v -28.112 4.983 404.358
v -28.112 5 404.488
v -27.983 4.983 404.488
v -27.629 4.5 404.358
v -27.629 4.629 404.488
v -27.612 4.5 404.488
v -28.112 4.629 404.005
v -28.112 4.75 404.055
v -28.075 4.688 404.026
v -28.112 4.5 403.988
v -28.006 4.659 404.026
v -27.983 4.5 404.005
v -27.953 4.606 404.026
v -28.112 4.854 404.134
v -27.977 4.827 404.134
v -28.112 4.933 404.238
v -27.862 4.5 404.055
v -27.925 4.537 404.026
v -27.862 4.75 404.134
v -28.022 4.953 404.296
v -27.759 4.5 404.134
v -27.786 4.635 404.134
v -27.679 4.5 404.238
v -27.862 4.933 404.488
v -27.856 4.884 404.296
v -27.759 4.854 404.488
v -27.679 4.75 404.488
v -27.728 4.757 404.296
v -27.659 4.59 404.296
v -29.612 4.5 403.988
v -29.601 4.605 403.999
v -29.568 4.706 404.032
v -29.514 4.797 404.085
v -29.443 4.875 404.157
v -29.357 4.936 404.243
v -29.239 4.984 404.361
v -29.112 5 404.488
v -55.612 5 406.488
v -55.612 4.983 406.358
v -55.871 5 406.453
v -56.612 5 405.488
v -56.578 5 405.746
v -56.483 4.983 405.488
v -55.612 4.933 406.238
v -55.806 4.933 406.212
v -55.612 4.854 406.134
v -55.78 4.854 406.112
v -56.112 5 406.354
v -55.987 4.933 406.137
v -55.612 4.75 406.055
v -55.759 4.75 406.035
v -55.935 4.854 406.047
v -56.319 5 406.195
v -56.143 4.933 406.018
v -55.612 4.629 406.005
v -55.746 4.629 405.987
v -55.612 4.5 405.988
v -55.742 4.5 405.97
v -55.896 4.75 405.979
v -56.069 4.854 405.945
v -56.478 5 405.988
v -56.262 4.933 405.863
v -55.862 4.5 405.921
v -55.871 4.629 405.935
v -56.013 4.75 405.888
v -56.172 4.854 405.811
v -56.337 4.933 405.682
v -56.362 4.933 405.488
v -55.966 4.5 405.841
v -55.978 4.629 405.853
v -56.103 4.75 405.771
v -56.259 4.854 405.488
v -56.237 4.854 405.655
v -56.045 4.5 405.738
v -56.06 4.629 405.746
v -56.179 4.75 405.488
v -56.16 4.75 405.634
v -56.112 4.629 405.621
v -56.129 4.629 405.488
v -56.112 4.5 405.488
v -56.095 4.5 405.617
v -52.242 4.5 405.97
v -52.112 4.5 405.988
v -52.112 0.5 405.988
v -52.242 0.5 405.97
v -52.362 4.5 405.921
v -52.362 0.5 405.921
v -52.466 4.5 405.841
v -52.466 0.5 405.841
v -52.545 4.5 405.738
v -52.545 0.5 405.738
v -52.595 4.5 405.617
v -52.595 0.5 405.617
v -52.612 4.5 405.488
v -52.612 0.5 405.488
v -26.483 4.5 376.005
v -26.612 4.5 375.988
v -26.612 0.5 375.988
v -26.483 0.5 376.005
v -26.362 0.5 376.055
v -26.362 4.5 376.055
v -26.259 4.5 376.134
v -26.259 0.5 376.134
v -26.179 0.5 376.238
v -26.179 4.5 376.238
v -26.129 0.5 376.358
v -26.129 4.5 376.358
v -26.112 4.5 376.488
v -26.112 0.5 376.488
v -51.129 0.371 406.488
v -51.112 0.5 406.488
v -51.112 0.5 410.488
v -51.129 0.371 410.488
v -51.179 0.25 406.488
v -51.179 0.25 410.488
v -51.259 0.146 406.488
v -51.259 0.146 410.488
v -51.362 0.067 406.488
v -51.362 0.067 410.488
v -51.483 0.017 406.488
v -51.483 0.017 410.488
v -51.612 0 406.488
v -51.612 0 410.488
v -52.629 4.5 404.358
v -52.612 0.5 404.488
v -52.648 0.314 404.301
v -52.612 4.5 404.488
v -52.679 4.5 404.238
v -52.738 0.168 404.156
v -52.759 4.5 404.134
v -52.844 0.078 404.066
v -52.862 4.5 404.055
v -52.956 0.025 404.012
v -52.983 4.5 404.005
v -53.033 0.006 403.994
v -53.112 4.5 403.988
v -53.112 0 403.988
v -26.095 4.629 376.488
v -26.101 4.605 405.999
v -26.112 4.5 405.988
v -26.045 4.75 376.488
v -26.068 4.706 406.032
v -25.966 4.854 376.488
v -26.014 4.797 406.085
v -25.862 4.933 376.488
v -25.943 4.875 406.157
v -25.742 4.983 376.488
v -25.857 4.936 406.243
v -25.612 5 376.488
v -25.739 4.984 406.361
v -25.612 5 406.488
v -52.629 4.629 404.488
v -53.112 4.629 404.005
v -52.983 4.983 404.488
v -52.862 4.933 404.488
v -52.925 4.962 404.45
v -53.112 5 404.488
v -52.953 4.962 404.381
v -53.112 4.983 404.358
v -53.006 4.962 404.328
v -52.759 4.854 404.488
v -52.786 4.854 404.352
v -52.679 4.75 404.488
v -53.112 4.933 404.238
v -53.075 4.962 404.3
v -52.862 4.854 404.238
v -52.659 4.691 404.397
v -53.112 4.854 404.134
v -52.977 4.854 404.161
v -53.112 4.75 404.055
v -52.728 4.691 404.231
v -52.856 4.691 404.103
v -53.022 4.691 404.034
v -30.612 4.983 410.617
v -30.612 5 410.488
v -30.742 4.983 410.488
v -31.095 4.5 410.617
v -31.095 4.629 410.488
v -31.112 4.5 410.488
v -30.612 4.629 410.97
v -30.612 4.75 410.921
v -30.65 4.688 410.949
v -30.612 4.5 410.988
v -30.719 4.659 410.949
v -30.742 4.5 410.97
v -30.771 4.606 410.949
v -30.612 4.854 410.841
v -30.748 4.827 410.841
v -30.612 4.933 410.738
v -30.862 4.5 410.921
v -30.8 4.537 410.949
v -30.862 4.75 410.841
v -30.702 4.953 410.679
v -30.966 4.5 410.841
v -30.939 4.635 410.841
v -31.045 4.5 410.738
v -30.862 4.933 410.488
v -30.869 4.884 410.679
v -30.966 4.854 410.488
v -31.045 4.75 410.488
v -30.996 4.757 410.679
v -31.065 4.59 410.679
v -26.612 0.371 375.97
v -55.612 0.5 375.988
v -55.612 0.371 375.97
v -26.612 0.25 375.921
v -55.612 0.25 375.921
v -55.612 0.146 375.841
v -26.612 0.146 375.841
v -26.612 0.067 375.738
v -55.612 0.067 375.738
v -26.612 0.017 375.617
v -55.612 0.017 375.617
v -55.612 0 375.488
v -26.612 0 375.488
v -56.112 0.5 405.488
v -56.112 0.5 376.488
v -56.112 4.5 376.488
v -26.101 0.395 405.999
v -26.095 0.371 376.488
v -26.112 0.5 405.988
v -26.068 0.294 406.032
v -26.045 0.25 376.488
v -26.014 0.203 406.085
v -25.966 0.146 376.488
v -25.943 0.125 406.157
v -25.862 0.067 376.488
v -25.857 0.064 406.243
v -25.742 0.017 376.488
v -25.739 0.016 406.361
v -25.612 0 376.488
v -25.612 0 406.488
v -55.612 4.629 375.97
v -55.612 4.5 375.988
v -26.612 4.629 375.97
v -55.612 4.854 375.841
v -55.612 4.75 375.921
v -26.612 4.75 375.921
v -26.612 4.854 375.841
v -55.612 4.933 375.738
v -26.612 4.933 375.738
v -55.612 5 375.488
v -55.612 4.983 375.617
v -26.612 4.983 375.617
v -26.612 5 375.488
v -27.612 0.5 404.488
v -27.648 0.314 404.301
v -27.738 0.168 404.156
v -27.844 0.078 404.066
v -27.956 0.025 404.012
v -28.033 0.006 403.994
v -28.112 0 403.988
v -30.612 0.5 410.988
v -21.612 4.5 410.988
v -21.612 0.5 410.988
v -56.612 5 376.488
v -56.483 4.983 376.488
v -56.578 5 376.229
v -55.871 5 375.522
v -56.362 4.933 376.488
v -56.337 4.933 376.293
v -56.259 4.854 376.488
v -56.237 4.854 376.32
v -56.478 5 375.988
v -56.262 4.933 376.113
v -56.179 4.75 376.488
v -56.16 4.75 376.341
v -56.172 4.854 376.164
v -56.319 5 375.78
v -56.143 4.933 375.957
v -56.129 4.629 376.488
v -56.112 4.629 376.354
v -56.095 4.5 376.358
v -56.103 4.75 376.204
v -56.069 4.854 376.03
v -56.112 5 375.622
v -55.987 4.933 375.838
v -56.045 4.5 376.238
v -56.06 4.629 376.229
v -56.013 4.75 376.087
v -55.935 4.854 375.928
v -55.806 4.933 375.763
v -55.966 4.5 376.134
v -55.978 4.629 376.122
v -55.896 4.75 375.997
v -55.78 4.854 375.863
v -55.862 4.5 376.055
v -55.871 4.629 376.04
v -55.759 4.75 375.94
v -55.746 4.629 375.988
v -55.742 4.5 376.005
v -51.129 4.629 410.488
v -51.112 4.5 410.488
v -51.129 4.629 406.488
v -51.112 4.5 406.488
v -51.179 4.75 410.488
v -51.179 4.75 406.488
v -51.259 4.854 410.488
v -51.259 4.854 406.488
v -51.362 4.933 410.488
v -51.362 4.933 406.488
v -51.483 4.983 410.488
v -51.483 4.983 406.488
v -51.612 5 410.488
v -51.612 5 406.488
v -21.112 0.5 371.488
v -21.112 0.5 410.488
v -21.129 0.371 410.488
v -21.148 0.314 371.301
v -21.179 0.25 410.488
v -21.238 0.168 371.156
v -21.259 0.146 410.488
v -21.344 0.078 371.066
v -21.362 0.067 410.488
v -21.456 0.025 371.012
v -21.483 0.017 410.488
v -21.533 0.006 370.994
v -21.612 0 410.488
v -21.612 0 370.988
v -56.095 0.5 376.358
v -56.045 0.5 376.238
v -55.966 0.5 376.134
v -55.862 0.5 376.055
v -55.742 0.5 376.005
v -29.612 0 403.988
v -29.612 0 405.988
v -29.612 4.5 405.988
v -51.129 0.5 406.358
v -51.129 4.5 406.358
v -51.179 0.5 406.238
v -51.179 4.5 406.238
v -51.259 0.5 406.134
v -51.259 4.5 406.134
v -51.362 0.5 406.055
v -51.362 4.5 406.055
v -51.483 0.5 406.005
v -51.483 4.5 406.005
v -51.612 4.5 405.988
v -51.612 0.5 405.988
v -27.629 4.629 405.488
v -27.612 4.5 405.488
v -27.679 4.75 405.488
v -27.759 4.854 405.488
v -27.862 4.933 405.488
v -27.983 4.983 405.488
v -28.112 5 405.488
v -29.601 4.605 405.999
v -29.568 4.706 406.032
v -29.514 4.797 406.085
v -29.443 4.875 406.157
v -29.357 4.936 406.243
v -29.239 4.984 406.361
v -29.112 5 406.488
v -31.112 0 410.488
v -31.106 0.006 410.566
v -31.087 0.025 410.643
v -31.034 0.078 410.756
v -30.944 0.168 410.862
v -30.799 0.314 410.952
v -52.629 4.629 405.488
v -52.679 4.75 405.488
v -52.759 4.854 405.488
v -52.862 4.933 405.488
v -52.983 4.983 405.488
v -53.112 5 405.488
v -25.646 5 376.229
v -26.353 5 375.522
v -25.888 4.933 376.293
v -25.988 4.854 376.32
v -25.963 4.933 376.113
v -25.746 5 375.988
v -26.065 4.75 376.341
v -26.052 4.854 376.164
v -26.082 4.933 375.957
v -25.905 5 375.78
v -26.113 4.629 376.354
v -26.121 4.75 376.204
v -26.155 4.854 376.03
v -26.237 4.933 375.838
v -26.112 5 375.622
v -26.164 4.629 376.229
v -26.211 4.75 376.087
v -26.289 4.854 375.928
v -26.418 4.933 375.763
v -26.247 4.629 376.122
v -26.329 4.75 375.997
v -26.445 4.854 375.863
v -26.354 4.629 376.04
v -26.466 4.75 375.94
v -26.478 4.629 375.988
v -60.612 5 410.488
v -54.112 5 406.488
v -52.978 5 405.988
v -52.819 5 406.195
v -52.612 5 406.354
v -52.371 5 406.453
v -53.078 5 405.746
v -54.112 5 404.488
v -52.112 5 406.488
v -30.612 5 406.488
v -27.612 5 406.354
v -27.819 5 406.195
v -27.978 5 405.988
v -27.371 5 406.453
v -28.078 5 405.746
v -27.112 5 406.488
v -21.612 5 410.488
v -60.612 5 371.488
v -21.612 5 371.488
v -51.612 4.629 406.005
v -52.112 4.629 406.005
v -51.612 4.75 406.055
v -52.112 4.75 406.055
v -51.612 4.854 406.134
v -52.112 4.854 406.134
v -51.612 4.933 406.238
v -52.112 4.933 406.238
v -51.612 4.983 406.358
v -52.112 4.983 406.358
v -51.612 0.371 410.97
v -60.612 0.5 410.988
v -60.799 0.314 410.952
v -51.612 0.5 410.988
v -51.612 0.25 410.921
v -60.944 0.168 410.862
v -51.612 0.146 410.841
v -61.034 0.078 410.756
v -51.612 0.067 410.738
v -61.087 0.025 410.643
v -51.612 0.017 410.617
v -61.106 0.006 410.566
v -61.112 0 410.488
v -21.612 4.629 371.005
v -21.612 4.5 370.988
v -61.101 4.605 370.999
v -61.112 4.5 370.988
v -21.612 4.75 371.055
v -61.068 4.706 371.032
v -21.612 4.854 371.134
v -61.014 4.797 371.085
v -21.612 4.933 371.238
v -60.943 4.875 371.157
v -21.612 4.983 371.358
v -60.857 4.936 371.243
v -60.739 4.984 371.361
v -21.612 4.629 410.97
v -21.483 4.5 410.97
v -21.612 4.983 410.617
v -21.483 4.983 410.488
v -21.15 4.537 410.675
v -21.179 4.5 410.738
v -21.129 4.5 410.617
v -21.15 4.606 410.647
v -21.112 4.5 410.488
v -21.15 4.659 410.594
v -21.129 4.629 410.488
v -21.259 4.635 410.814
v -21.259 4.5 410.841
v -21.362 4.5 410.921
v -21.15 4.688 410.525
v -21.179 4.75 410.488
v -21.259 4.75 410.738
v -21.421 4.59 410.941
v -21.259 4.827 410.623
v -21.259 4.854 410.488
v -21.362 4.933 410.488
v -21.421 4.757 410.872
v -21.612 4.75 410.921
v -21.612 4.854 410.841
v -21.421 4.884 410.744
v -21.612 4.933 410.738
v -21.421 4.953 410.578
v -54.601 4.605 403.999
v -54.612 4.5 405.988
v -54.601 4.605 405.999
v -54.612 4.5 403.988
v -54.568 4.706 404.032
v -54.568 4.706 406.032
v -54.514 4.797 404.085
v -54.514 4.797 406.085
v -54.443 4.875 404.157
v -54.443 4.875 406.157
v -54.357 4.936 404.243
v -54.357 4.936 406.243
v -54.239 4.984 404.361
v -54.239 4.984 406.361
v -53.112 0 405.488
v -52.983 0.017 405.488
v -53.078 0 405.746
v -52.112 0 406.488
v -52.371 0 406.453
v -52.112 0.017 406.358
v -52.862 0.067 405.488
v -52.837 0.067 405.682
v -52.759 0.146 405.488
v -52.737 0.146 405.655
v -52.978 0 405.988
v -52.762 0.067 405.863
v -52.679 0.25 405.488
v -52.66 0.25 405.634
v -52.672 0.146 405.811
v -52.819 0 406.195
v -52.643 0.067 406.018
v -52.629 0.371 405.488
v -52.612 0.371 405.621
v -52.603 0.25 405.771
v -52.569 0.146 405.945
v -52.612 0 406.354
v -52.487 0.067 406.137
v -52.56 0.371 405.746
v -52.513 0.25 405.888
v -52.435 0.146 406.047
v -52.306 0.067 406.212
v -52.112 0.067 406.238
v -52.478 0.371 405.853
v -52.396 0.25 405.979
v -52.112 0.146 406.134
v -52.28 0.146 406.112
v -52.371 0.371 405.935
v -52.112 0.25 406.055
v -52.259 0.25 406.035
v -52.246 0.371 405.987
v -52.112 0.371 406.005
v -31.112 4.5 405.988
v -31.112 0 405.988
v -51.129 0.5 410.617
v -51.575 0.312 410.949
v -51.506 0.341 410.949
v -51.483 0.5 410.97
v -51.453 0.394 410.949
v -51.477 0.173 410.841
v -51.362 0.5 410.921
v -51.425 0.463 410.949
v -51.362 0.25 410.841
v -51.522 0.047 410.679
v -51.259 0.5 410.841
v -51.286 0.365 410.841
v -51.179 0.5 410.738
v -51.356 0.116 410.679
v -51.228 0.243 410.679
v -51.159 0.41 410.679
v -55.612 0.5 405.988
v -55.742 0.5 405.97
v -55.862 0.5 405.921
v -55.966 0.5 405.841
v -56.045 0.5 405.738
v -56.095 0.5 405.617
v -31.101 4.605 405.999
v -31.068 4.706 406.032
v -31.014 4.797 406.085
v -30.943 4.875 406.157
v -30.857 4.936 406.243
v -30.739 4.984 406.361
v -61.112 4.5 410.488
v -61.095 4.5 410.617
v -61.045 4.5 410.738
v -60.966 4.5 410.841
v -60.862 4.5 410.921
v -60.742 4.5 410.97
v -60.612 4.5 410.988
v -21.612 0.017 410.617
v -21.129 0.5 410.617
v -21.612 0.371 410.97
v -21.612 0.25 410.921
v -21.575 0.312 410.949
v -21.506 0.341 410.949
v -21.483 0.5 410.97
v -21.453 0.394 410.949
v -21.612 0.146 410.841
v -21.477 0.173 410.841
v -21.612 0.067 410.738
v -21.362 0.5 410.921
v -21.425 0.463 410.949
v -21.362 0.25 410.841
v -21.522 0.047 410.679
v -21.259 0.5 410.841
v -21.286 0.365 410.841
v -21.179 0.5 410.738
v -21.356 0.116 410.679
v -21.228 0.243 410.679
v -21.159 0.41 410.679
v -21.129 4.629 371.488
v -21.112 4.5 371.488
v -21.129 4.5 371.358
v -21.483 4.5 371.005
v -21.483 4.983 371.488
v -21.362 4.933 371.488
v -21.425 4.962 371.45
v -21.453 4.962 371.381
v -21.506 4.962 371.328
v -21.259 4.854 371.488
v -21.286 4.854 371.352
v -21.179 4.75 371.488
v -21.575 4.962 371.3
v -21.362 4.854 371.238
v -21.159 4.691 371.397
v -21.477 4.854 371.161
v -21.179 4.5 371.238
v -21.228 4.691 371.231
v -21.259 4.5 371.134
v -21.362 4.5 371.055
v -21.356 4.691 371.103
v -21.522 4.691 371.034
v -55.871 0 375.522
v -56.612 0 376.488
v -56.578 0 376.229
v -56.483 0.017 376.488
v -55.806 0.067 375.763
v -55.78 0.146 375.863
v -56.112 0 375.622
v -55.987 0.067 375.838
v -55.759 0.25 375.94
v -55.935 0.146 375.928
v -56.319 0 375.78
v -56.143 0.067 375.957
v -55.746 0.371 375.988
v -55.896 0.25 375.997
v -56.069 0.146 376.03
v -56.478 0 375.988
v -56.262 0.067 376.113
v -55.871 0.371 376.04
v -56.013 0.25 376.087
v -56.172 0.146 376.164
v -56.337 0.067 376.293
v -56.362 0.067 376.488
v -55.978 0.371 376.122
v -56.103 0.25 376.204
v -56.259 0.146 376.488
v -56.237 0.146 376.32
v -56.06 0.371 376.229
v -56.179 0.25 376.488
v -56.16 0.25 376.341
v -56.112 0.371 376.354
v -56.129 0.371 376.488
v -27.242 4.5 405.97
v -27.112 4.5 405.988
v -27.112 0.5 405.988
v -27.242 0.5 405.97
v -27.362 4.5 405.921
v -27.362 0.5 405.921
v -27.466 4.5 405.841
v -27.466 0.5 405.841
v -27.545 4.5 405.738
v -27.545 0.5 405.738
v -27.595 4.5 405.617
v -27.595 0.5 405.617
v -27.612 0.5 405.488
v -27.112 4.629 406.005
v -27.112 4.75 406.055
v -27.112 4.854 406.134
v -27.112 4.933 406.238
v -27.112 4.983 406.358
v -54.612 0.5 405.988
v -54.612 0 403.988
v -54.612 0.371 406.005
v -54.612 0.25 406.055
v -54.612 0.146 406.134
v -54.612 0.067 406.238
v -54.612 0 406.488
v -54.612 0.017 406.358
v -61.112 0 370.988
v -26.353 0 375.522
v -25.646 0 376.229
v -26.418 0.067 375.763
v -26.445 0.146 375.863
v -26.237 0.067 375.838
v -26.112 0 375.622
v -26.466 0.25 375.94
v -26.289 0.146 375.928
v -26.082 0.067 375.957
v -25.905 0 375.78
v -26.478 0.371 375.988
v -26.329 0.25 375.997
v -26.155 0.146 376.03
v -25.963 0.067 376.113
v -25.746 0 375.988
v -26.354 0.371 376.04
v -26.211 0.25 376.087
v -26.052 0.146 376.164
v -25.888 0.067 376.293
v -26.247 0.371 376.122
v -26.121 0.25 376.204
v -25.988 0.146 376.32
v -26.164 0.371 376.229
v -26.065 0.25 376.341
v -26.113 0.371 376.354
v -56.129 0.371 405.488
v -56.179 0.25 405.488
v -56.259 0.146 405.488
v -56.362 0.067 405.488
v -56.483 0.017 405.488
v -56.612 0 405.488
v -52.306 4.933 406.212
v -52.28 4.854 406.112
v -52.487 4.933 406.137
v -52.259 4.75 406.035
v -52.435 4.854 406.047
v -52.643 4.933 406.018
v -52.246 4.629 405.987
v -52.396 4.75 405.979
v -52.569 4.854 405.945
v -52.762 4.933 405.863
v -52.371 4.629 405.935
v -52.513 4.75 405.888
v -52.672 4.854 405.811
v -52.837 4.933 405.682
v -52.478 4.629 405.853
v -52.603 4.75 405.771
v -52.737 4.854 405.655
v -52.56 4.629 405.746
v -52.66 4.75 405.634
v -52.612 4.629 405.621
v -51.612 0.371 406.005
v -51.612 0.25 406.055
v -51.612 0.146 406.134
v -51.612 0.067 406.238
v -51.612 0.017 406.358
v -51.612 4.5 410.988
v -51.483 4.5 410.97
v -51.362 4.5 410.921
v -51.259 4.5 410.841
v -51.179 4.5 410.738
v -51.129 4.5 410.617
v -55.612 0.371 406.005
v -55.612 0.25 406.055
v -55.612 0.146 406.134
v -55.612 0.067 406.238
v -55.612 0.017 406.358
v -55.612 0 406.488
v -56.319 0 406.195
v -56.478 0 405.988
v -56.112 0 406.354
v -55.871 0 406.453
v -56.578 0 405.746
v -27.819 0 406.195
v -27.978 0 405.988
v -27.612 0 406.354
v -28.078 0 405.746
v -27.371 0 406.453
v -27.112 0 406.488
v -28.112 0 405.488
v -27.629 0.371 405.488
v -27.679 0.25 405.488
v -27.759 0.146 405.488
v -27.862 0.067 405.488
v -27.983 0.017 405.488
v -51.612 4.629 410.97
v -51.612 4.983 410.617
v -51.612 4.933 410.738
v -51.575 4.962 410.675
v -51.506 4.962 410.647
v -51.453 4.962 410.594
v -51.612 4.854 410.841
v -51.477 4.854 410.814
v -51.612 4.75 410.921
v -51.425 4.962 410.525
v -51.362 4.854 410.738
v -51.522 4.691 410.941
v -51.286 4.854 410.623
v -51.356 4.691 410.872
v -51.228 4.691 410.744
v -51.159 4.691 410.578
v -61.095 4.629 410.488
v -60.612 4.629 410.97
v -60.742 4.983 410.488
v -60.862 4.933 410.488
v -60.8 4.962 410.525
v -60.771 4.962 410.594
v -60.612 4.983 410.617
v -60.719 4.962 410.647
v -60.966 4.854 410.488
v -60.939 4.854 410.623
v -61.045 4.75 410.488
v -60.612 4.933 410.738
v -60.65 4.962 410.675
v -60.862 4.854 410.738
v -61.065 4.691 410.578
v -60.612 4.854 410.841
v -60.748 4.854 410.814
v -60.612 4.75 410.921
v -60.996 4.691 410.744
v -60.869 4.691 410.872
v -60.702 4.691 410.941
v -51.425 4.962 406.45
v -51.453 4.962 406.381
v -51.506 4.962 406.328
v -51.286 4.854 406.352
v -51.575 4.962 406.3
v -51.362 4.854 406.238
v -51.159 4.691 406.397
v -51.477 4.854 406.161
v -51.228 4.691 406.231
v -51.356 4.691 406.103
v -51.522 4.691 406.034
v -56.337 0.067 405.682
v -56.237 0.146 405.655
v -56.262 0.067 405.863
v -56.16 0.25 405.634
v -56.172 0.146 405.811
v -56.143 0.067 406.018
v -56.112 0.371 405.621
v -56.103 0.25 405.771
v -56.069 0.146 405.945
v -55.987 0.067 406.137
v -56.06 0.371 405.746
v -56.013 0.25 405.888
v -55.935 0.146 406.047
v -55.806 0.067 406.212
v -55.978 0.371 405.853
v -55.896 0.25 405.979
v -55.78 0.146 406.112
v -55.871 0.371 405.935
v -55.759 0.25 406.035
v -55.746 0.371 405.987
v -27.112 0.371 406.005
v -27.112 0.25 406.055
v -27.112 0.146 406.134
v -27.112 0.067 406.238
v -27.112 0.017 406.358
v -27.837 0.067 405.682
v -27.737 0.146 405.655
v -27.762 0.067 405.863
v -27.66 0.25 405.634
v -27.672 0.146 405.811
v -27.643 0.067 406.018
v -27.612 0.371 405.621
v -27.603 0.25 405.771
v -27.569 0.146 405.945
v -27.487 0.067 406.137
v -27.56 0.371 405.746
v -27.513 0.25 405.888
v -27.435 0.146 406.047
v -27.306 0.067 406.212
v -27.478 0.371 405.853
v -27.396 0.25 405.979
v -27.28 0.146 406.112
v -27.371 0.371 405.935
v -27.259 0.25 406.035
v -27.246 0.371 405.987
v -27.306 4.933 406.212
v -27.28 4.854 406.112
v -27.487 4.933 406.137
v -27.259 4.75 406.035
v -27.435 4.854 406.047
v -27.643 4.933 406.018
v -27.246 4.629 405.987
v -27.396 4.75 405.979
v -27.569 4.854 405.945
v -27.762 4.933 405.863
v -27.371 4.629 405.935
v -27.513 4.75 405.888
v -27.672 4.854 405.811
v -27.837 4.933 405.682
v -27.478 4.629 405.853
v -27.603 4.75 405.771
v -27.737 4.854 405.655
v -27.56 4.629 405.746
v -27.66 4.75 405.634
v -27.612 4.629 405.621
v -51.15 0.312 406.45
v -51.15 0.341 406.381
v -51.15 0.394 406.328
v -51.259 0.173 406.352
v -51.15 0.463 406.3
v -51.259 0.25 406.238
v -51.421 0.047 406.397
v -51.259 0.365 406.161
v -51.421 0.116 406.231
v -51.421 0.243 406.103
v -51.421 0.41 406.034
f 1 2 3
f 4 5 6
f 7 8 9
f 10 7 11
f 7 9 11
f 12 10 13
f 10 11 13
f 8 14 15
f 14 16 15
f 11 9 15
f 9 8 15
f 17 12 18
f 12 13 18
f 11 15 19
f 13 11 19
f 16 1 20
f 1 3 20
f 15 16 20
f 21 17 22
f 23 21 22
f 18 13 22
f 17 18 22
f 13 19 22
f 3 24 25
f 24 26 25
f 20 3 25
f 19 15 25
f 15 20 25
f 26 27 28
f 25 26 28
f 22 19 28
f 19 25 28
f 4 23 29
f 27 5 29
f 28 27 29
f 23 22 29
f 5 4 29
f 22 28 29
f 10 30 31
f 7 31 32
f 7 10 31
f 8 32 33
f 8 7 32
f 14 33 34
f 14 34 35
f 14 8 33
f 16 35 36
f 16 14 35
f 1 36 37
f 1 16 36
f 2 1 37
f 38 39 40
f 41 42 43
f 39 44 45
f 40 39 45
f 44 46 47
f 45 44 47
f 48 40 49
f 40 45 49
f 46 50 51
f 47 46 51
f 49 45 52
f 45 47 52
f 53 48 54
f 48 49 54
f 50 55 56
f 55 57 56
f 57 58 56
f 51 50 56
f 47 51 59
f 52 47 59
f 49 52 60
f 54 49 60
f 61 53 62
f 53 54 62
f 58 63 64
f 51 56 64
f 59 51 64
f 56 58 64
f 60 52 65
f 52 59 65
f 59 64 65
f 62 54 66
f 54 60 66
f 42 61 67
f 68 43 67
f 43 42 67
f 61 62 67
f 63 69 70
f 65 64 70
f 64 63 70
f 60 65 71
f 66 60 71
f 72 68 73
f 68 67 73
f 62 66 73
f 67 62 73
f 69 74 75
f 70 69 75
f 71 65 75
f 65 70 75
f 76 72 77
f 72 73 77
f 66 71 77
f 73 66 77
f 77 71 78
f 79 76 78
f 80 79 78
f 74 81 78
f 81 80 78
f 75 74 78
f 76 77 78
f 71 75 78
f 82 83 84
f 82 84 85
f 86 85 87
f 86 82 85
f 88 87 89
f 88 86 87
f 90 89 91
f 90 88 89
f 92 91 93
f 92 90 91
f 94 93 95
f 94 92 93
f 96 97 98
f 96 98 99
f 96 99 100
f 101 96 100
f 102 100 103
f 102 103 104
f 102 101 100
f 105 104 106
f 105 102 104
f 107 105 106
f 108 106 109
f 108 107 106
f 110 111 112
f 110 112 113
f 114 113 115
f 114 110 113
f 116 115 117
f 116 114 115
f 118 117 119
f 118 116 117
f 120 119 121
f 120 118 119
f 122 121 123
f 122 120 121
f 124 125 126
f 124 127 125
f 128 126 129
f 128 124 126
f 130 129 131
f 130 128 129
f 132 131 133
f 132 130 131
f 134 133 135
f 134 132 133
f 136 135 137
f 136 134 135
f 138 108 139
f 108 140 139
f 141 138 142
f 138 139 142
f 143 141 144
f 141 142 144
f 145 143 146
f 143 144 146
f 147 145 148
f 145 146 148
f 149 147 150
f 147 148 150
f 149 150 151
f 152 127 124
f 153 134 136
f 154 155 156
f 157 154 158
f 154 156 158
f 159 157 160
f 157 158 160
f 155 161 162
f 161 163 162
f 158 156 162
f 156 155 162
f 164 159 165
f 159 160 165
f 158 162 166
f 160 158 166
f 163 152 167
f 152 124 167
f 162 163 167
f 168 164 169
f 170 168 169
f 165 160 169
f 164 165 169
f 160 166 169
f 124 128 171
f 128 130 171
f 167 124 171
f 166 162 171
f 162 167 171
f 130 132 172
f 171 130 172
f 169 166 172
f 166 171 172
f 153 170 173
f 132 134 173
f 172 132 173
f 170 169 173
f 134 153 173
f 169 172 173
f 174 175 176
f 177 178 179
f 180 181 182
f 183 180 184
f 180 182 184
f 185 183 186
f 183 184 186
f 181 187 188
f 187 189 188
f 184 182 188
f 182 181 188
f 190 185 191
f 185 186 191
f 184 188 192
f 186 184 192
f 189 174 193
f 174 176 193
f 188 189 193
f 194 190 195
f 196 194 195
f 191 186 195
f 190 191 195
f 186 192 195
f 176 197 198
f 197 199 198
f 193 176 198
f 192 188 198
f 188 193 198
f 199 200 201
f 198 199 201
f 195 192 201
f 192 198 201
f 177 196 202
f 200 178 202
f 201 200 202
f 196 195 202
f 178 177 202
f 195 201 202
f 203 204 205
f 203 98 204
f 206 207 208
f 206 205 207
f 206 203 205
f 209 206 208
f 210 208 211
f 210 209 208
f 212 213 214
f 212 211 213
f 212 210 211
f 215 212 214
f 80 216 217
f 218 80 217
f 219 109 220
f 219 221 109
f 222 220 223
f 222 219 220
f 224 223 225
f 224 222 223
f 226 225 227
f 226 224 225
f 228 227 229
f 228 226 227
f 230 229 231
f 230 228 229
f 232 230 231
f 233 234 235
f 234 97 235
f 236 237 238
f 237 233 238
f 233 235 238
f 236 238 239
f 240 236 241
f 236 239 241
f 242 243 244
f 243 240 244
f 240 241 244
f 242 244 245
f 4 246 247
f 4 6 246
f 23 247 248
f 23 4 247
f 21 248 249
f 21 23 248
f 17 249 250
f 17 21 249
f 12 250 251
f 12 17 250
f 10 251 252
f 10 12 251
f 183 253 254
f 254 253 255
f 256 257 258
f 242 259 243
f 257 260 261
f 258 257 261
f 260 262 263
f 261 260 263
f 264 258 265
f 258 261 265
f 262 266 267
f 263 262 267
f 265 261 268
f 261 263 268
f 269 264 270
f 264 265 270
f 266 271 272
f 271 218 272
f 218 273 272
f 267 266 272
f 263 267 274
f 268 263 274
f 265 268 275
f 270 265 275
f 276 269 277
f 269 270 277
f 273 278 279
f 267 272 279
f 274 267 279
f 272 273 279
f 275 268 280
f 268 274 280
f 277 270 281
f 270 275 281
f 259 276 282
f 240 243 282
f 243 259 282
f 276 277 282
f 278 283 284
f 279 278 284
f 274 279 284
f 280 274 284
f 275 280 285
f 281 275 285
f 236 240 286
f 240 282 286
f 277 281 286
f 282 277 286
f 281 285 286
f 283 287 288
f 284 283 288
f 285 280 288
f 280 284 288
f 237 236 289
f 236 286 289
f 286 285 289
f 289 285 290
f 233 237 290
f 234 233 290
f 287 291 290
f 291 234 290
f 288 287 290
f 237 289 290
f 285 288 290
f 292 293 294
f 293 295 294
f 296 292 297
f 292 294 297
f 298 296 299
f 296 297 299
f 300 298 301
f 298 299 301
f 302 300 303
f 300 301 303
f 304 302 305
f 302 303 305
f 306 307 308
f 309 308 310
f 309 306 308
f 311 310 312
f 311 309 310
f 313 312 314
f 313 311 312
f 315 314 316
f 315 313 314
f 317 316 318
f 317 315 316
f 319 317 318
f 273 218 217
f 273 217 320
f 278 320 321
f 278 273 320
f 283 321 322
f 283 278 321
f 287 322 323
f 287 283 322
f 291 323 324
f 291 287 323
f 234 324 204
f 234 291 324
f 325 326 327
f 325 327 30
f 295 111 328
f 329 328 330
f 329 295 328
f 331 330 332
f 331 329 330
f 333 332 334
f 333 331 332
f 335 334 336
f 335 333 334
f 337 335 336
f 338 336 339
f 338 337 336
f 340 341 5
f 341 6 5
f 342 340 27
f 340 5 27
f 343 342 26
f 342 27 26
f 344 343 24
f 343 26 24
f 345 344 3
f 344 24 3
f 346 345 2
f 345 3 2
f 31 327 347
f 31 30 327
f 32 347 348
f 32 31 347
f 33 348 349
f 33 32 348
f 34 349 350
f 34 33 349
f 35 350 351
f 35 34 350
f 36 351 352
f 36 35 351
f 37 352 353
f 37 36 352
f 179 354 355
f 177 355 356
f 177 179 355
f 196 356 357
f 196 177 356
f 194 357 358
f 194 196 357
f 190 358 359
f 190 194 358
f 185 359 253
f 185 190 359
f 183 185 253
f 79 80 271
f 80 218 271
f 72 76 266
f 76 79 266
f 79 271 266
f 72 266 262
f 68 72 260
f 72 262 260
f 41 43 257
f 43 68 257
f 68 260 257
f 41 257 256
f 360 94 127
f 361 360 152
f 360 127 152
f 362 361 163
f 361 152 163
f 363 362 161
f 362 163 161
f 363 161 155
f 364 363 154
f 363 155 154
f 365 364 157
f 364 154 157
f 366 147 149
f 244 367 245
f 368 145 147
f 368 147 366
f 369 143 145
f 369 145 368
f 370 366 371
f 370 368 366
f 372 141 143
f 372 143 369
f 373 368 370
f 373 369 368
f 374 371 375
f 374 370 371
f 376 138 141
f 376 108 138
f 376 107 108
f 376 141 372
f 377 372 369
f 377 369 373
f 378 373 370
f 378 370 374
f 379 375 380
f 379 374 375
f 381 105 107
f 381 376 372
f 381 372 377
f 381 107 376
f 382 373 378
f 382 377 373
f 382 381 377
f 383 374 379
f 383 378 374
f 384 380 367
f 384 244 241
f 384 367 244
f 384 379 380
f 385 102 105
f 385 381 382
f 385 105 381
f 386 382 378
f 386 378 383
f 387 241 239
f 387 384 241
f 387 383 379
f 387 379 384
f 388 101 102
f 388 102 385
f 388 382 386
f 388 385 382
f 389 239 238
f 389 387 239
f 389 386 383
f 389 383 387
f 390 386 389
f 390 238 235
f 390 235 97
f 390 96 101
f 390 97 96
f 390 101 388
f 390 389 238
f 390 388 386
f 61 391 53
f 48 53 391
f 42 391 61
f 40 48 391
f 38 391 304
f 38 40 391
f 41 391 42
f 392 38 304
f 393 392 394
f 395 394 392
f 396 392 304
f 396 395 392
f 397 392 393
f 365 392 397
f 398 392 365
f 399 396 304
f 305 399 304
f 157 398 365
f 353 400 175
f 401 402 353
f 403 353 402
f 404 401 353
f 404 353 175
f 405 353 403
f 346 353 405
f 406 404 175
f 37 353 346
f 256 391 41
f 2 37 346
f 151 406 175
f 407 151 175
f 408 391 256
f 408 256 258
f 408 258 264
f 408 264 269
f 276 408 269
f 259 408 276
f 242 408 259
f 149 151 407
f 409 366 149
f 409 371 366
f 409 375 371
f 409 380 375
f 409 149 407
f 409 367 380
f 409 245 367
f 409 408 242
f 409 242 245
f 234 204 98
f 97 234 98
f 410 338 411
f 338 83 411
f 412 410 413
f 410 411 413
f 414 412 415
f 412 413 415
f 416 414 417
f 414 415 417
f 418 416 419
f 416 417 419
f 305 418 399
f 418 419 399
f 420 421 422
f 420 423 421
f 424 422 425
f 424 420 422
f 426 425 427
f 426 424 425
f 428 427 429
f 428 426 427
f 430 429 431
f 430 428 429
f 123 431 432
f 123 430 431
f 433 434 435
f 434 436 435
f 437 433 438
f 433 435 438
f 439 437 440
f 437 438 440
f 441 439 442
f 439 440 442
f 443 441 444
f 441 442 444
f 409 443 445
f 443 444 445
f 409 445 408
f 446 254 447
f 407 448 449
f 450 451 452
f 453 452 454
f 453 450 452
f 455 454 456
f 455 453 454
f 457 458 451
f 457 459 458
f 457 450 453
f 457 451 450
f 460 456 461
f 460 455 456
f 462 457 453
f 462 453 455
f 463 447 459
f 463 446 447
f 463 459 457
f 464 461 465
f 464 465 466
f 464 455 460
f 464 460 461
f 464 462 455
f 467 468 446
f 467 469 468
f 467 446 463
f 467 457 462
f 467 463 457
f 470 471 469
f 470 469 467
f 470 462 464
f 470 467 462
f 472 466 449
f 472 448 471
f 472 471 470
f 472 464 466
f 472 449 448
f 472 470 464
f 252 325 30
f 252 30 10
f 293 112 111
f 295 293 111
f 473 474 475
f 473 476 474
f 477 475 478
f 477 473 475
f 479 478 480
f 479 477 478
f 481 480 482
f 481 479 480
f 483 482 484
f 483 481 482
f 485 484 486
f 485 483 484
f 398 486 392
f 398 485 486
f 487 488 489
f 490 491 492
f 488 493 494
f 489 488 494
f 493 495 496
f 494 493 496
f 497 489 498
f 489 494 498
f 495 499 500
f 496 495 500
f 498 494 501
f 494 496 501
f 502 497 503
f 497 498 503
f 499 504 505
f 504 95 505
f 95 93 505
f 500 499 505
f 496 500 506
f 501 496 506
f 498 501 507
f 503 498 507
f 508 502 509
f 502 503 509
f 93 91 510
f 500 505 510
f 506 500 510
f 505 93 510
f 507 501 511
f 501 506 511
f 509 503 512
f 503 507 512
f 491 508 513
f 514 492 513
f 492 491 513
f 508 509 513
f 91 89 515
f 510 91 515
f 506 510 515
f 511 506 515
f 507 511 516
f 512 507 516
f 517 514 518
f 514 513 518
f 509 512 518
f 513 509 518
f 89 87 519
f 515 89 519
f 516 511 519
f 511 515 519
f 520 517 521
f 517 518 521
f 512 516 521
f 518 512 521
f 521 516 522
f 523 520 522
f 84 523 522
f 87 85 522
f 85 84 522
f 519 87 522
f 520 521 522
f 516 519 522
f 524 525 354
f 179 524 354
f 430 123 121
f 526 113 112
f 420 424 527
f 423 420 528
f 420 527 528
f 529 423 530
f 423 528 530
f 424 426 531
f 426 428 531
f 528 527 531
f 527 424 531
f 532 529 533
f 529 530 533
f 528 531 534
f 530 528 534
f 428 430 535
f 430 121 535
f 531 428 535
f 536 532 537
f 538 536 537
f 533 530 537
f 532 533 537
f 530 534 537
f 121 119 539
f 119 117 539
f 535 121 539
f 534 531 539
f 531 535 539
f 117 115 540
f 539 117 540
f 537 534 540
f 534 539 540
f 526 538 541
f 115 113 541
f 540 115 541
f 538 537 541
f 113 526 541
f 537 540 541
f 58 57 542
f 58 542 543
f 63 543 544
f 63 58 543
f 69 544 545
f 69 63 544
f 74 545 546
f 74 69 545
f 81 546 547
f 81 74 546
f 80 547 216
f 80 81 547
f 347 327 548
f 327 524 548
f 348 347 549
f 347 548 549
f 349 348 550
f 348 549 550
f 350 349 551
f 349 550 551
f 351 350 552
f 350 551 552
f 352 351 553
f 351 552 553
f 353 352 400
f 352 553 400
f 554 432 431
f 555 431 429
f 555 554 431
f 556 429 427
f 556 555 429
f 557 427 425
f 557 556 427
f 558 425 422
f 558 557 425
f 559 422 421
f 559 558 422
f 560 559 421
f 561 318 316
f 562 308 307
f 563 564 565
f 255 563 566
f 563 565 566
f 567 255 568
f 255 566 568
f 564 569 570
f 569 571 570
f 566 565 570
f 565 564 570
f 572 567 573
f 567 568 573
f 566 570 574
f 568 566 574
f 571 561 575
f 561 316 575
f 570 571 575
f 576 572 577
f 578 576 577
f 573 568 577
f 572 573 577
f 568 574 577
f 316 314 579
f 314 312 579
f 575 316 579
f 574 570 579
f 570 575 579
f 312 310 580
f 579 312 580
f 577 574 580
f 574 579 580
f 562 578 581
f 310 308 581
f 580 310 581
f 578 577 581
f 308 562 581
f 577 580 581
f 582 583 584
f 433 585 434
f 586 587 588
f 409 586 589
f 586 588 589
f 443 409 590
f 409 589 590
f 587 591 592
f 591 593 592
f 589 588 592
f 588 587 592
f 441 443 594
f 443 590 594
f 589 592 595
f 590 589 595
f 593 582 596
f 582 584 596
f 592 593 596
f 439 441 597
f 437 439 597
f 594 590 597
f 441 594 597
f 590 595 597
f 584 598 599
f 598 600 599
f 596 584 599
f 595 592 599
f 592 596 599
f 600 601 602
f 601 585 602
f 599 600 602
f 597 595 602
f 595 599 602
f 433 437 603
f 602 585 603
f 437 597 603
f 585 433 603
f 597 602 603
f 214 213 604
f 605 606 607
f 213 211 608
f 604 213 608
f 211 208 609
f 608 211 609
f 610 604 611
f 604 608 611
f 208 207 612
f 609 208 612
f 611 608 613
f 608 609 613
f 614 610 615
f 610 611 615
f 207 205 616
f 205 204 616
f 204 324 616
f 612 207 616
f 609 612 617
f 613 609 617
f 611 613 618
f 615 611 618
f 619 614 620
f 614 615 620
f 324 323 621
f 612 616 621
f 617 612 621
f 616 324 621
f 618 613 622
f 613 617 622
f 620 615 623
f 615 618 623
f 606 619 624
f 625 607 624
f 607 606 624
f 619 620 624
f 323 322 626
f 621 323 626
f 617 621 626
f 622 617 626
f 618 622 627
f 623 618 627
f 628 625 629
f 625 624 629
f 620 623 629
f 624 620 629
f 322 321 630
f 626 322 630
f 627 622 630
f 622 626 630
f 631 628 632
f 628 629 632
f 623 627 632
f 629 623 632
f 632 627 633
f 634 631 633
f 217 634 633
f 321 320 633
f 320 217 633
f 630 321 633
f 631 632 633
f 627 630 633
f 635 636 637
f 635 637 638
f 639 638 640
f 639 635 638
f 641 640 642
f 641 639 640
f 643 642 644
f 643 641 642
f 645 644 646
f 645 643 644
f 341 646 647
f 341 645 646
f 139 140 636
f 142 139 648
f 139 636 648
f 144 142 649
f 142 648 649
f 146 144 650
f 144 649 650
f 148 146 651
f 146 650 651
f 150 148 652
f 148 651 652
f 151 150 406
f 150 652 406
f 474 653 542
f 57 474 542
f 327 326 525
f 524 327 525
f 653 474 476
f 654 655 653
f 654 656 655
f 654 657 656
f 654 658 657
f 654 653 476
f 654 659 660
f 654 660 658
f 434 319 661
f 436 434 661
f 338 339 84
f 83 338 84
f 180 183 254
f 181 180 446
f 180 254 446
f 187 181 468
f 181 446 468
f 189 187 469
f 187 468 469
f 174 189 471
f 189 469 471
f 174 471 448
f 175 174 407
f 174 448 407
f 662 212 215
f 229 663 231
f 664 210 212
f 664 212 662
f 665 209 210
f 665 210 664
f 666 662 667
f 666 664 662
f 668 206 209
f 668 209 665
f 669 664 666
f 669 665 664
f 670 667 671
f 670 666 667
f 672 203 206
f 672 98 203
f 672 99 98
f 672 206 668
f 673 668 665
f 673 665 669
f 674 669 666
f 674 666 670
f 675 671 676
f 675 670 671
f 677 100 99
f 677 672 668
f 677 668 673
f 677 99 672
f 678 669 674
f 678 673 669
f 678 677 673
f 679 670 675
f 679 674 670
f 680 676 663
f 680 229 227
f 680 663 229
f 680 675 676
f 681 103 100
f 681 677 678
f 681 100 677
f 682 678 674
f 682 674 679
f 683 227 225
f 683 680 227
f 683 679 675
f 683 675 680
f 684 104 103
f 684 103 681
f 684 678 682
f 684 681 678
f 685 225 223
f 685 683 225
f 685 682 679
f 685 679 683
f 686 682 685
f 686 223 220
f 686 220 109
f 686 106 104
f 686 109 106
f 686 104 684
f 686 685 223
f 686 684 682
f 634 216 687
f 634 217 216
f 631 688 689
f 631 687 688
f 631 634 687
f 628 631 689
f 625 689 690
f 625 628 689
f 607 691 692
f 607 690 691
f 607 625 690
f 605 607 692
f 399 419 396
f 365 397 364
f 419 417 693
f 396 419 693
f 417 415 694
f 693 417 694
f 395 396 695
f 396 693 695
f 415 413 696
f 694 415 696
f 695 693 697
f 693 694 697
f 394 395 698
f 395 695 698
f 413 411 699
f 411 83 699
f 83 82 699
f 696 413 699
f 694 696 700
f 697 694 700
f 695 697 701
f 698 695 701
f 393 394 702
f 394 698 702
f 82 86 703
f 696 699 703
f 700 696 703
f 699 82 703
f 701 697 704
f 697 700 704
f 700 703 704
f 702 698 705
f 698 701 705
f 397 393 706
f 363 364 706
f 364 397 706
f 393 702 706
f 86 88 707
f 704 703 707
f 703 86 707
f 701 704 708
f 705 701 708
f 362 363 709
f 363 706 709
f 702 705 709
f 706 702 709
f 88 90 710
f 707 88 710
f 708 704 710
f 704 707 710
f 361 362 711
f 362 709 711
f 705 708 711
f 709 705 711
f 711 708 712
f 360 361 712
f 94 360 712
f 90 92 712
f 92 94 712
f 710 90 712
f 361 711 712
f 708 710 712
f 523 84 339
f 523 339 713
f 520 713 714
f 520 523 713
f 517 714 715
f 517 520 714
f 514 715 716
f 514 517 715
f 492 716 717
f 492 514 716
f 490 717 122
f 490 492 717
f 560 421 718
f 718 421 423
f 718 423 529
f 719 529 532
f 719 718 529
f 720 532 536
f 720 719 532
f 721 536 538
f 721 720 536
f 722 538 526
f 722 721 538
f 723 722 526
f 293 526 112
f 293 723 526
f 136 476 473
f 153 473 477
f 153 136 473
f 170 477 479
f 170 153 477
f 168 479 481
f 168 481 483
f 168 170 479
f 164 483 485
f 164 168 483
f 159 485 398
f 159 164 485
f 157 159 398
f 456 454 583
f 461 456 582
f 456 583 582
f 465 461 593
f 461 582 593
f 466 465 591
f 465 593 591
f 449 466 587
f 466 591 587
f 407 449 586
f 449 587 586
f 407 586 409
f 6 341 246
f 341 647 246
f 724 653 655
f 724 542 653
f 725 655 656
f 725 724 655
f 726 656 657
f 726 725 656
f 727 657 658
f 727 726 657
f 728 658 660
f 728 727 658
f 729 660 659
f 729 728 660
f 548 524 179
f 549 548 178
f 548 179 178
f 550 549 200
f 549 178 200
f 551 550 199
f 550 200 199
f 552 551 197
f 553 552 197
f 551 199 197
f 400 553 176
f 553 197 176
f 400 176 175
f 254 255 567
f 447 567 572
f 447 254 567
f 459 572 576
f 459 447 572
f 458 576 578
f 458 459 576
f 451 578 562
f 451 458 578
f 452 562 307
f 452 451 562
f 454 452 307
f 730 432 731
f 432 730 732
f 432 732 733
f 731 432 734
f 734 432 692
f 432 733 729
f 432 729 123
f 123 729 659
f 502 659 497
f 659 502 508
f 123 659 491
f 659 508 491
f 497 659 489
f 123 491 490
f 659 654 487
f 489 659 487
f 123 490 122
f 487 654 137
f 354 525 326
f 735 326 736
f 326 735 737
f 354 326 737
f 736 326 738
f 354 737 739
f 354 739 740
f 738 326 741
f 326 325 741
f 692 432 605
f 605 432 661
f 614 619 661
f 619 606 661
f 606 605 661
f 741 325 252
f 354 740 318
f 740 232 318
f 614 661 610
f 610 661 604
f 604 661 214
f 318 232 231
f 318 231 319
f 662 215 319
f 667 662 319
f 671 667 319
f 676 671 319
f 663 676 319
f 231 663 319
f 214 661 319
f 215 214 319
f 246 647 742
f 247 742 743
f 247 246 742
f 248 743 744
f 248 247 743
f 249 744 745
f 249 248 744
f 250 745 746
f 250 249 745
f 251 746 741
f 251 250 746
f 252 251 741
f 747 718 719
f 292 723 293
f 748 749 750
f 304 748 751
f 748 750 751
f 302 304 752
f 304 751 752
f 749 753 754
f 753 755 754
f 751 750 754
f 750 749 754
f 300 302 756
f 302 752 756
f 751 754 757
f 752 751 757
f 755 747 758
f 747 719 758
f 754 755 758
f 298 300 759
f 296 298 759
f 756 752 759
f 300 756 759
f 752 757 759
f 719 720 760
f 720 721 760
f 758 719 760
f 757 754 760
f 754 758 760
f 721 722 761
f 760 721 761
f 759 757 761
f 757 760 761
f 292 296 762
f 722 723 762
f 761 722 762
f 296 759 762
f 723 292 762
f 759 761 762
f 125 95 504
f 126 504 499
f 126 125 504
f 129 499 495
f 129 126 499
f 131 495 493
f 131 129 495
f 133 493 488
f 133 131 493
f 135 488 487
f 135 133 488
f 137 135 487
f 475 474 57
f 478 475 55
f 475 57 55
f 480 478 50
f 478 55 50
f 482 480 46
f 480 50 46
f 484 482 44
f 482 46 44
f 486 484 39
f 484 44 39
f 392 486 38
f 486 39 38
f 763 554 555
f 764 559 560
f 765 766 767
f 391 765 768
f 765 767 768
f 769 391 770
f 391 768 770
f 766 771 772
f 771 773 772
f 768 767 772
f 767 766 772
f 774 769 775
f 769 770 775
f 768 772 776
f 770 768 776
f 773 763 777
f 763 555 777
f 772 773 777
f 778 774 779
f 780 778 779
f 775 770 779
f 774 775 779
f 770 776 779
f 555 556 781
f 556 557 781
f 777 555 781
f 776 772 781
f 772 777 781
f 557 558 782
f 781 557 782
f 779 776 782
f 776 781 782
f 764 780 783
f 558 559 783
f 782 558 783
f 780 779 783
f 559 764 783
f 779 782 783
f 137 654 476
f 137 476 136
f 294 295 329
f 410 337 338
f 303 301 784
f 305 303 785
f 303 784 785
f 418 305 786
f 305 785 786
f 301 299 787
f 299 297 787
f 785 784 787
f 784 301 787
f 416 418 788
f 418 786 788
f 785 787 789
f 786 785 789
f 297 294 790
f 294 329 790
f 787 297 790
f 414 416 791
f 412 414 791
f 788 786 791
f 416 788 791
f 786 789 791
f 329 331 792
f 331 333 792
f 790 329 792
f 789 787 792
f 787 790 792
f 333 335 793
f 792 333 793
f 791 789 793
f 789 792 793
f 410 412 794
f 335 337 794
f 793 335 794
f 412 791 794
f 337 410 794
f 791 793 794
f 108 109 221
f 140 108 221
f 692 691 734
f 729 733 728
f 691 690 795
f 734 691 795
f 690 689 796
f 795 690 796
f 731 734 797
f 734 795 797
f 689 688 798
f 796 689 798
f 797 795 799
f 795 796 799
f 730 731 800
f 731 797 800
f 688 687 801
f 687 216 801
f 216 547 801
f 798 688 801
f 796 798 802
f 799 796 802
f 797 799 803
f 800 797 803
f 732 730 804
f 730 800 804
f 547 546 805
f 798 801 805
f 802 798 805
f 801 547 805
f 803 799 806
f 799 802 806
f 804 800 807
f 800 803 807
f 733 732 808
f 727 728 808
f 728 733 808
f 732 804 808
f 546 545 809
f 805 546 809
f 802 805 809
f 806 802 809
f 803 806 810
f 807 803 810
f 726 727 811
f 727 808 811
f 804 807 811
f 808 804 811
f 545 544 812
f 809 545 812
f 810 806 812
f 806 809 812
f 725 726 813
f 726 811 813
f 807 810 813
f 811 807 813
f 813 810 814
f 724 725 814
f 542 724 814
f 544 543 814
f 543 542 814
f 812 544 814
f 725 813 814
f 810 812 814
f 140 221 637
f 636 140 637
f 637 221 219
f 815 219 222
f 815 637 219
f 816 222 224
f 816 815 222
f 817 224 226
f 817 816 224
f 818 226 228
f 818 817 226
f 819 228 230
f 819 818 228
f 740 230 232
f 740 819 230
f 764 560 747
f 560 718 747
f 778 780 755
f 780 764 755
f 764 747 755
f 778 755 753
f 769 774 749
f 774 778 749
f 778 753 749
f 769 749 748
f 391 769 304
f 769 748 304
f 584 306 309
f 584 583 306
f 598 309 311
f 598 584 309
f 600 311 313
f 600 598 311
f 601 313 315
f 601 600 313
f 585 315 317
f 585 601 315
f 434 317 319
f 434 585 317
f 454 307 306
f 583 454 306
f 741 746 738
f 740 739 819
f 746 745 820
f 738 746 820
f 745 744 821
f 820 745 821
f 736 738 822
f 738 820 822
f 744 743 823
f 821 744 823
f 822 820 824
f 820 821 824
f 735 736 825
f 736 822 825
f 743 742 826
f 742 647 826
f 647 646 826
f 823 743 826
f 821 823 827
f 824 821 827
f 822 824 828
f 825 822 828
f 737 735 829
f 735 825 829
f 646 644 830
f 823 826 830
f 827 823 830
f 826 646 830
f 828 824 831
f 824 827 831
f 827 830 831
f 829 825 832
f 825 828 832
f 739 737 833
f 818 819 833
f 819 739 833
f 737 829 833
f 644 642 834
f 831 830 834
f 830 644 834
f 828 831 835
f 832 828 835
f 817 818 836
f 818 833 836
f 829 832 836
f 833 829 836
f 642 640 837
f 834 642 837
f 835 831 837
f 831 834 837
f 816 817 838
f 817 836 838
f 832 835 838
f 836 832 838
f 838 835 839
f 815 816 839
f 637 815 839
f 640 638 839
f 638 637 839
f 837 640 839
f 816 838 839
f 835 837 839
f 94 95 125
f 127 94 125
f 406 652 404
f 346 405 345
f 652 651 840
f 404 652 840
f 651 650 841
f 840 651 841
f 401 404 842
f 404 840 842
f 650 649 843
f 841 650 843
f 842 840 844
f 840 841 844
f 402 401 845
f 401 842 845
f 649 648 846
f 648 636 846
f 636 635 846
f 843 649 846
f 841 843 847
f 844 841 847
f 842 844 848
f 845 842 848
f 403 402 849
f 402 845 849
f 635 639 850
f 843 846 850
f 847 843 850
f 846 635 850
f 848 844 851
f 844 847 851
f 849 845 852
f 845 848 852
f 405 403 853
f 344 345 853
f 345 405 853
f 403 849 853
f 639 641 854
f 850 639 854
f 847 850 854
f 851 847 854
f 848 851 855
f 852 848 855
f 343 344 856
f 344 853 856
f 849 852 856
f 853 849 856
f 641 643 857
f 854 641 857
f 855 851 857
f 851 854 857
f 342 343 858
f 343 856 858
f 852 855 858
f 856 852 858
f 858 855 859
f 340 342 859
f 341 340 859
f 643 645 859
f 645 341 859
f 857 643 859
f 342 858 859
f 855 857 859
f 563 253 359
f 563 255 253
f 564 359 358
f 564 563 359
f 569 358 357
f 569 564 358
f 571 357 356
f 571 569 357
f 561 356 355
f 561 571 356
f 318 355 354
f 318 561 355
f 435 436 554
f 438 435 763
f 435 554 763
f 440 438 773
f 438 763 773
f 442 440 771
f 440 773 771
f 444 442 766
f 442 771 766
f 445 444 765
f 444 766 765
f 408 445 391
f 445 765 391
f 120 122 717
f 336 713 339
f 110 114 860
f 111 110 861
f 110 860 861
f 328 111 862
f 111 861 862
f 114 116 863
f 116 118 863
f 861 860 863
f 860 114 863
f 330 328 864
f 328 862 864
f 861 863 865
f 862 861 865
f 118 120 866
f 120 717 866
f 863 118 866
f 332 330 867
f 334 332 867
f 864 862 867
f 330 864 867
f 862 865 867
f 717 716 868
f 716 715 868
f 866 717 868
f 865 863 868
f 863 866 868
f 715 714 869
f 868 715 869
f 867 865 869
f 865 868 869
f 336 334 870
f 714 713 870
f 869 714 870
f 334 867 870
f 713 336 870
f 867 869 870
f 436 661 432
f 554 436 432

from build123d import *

# Parameters (mm, degrees)
SKETCH1_W           = 2
SKETCH1_H           = 2
BOSS_EXTRUDE1_DEPTH = 5
FILLET1_R           = 0.5


with BuildPart() as part:
    # Sketch1 → Boss-Extrude1 (new body)
    with BuildSketch(Plane(origin=(0, 0, 0), x_dir=(1, 0, 0), z_dir=(0, 1, 0))):
        Polygon((-53.419958922, -370.98752745), (-61.112267161, -370.98752745), (-61.112267161, -380.152018312), (-61.112267161, -410.98752745), (-56.112267161, -410.98752745), (-56.112267161, -405.98752745), (-56.112267161, -375.98752745), (-26.112267161, -375.98752745), (-26.112267161, -405.98752745), (-26.112267161, -410.98752745), (-21.112267161, -410.98752745), (-21.112267161, -380.152018312), (-21.112267161, -370.98752745), align=None)
        Polygon((-56.112267161, -405.98752745), (-56.112267161, -410.98752745), (-51.112267161, -410.98752745), (-51.112267161, -405.98752745), (-52.612267161, -405.98752745), (-54.612267161, -405.98752745), align=None)
        Polygon((-31.112267161, -410.98752745), (-26.112267161, -410.98752745), (-26.112267161, -405.98752745), (-27.612267161, -405.98752745), (-29.612267161, -405.98752745), (-31.112267161, -405.98752745), align=None)
        with Locations((-53.612267161, -404.98752745)):
            Rectangle(SKETCH1_W, SKETCH1_H)
        with Locations((-28.612267161, -404.98752745)):
            Rectangle(SKETCH1_W, SKETCH1_H)
    extrude(amount=BOSS_EXTRUDE1_DEPTH)

    # Fillet1
    fillet1_edges = [part.edges().sort_by_distance(p)[0] for p in [
        (-27.612267161, 5, 404.98752745),
        (-28.612267161, 5, 403.98752745),
        (-41.112267161, 0, 375.98752745),
        (-56.112267161, 0, 390.98752745),
        (-55.362267161, 0, 405.98752745),
        (-29.612267161, 5, 404.98752745),
        (-52.612267161, 0, 404.98752745),
        (-51.862267161, 0, 405.98752745),
        (-51.112267161, 0, 408.48752745),
        (-56.112267161, 0, 410.98752745),
        (-30.362267161, 5, 405.98752745),
        (-21.112267161, 0, 390.98752745),
        (-26.112267161, 0, 410.98752745),
        (-31.112267161, 5, 408.48752745),
        (-27.612267161, 0, 404.98752745),
        (-26.862267161, 0, 405.98752745),
        (-26.112267161, 0, 390.98752745),
        (-26.112267161, 5, 410.98752745),
        (-26.112267161, 2.5, 375.98752745),
        (-56.112267161, 2.5, 375.98752745),
        (-56.112267161, 2.5, 405.98752745),
        (-52.612267161, 2.5, 403.98752745),
        (-52.612267161, 2.5, 405.98752745),
        (-51.112267161, 2.5, 405.98752745),
        (-51.112267161, 2.5, 410.98752745),
        (-61.112267161, 2.5, 410.98752745),
        (-21.112267161, 2.5, 370.98752745),
        (-21.112267161, 2.5, 410.98752745),
        (-31.112267161, 2.5, 410.98752745),
        (-27.612267161, 2.5, 403.98752745),
        (-27.612267161, 2.5, 405.98752745),
        (-26.112267161, 5, 390.98752745),
        (-21.112267161, 5, 390.98752745),
        (-41.112267161, 5, 370.98752745),
        (-61.112267161, 5, 390.98752745),
        (-56.112267161, 5, 410.98752745),
        (-51.112267161, 5, 408.48752745),
        (-51.862267161, 5, 405.98752745),
        (-52.612267161, 5, 404.98752745),
        (-53.612267161, 5, 403.98752745),
        (-54.612267161, 5, 404.98752745),
        (-55.362267161, 5, 405.98752745),
        (-56.112267161, 5, 390.98752745),
        (-26.862267161, 5, 405.98752745),
        (-41.112267161, 5, 375.98752745),
    ]]
    fillet(fillet1_edges, radius=FILLET1_R)


solid = part.part
